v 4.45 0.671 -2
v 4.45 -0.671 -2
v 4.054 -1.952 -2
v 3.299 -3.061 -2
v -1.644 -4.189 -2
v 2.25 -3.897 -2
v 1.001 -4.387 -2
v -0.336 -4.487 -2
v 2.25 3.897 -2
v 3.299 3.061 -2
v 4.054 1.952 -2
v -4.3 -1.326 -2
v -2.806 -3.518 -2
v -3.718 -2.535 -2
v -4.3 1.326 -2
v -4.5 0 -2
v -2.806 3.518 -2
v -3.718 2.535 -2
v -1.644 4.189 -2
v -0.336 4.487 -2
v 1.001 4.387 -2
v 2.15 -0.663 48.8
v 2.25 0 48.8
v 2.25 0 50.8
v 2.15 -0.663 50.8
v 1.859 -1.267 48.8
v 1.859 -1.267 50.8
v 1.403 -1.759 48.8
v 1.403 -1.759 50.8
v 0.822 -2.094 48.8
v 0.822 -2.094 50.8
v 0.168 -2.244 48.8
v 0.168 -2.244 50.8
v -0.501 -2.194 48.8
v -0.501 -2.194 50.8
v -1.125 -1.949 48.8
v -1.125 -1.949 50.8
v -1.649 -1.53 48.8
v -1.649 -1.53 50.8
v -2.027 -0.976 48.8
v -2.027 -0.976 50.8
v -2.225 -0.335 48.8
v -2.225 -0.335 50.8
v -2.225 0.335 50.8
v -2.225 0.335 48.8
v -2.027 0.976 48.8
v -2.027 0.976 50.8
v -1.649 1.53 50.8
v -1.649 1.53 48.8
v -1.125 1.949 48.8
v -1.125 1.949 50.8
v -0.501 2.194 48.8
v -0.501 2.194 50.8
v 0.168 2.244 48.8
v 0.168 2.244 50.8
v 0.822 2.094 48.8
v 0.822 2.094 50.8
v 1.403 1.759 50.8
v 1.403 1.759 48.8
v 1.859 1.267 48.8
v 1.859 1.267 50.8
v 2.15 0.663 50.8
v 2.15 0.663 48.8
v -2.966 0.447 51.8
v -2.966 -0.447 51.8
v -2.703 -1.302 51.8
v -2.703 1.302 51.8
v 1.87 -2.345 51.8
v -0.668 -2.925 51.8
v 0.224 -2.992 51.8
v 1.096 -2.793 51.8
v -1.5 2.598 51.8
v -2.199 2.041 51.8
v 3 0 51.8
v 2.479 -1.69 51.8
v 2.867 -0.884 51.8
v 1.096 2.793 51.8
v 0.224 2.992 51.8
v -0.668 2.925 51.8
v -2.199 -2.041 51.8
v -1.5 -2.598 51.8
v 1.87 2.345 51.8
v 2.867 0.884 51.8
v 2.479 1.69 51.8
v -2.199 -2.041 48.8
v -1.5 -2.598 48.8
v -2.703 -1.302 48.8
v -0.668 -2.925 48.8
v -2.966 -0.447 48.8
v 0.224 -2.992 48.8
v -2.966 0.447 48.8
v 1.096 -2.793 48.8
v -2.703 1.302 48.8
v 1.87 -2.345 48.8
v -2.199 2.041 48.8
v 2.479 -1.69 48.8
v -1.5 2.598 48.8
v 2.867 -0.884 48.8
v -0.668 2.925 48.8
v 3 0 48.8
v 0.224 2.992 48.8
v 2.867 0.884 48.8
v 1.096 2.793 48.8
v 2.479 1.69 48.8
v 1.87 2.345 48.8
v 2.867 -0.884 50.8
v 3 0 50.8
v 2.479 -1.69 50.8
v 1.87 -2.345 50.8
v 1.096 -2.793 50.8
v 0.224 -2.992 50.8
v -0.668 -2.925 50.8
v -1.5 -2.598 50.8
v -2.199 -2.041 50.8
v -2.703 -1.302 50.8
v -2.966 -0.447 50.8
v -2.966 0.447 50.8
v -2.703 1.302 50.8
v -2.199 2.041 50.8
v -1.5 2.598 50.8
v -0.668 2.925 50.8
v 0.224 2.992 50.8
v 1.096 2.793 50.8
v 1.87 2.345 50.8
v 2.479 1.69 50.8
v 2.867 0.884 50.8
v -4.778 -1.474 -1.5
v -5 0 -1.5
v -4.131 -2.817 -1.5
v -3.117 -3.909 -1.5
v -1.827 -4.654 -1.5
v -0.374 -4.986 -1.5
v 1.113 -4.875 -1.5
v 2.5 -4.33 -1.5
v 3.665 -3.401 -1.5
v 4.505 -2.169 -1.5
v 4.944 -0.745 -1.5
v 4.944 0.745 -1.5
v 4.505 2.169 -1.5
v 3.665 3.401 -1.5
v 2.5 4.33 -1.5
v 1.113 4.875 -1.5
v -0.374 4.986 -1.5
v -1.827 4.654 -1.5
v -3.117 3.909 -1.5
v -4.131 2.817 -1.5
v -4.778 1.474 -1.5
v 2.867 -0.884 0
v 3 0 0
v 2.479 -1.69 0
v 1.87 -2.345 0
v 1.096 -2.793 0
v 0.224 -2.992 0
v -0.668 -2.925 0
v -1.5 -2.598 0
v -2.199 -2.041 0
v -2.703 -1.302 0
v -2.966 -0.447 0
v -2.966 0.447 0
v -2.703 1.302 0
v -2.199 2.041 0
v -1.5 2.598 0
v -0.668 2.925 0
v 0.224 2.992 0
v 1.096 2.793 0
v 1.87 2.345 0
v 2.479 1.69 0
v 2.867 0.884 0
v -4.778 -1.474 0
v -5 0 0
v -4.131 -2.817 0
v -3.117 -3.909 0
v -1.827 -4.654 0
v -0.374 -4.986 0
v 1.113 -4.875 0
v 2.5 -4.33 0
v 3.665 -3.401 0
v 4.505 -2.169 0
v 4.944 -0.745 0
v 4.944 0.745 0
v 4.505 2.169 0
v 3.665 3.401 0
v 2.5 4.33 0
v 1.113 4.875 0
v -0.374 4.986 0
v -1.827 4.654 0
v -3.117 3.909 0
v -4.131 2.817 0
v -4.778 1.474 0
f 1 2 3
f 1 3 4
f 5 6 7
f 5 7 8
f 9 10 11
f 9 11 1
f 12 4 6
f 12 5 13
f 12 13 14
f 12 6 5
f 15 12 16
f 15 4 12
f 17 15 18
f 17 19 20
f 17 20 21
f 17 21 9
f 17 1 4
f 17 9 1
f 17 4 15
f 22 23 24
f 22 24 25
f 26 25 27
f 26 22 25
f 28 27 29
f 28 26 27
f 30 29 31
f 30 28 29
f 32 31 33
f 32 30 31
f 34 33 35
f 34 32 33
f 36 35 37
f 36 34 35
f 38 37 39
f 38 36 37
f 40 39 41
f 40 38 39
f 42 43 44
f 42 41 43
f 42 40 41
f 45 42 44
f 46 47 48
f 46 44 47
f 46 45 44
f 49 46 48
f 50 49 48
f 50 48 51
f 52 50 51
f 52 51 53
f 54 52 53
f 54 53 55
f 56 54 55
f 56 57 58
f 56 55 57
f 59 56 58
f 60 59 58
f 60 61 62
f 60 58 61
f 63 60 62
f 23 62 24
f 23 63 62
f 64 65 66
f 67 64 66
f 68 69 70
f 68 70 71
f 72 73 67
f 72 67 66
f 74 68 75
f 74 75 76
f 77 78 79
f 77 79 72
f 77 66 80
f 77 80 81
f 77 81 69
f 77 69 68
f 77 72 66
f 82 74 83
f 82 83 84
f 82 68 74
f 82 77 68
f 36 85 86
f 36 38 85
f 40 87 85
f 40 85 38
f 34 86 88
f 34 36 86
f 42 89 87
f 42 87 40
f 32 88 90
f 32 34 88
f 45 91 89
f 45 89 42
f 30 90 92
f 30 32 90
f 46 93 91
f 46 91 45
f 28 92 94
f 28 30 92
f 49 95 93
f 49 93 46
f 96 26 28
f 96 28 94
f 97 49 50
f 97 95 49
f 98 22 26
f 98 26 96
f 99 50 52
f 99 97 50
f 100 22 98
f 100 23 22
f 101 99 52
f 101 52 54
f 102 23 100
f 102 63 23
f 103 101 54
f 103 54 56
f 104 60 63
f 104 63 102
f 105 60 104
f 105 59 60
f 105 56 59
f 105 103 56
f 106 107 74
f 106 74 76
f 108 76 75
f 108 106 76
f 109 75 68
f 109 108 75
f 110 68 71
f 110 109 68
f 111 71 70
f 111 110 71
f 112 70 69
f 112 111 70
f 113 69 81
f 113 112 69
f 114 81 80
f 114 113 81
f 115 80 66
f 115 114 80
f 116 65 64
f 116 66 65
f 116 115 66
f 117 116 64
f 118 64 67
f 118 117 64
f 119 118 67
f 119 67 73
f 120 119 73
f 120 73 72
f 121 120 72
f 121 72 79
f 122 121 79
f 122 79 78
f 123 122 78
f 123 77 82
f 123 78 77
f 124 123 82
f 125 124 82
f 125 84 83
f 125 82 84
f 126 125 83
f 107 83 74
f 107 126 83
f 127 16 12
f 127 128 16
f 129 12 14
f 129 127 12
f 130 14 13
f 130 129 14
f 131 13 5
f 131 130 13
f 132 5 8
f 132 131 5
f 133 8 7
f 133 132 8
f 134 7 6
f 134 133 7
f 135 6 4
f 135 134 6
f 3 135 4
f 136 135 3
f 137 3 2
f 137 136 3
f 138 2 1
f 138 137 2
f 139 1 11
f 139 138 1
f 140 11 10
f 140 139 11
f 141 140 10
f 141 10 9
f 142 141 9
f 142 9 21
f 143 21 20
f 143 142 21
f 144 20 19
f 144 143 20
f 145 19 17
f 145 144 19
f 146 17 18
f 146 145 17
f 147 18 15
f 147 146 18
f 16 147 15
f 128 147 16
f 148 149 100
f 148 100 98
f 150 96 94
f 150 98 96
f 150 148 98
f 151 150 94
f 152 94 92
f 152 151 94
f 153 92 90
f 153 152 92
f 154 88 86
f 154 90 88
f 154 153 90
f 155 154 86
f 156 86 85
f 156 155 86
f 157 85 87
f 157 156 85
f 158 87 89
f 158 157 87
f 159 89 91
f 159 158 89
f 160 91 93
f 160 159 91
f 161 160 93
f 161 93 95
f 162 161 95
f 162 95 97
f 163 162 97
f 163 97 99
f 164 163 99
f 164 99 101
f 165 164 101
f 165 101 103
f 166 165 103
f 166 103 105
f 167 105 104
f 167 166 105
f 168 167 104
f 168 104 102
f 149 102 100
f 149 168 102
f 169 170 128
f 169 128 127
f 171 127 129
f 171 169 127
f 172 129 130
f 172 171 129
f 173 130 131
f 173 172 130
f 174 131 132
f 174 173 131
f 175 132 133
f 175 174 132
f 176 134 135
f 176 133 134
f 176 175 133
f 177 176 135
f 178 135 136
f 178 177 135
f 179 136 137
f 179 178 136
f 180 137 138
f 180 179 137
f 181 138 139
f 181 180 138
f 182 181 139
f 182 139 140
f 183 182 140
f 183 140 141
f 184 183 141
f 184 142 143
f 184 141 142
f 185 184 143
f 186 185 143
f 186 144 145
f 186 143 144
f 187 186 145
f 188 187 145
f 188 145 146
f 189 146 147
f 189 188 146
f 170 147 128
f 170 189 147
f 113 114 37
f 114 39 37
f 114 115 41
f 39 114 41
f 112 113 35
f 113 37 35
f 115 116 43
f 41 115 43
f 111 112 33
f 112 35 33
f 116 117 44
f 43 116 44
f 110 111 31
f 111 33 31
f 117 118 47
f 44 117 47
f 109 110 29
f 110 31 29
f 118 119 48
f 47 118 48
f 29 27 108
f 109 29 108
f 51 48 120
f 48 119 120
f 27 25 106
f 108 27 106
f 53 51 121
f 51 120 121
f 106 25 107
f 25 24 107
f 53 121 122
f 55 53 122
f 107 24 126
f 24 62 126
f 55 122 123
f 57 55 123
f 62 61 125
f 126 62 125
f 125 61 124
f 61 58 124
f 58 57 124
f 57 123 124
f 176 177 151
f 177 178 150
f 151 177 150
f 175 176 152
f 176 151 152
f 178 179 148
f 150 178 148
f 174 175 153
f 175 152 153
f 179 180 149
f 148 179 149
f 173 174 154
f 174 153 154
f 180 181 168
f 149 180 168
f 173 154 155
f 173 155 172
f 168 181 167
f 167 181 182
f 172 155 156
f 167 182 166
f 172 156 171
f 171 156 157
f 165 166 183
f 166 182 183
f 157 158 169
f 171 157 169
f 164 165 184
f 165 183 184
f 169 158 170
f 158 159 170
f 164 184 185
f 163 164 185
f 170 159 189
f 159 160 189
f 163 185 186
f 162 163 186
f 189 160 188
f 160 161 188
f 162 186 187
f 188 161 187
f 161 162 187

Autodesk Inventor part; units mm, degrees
ref_plane "YZ Plane" through (0, 0, 0) normal (1, 0, 0) x (0, 1, 0)
ref_plane "XZ Plane" through (0, 0, 0) normal (0, 1, 0) x (-1, 0, 0)
ref_plane "XY Plane" through (0, 0, 0) normal (0, 0, 1) x (1, 0, 0)
sketch "スケッチ1" plane through (0, 0, 0) normal (0, 0, 1) x (1, 0, 0)
  circle A0 centre (0, 0) radius 3
  dimension "d0" = 6
extrude "押し出し1" add sketch "スケッチ1" along normal blind 47.8
sketch "スケッチ2" plane through (0, 0, 0) normal (0, 0, -1) x (-1, 0, 0)
  circle A0 centre (0, 0) radius 3 projected
  circle A1 centre (0, 0) radius 5
  dimension "d3" = 10
extrude "押し出し2" add sketch "スケッチ2" along normal blind 2 contours A0 | A1
sketch "スケッチ3" plane through (0, 0, 47.8) normal (0, 0, 1) x (1, 0, 0)
  circle A0 centre (0, 0) radius 3 projected
extrude "押し出し3" add sketch "スケッチ3" along normal blind 1
sketch "スケッチ4" plane through (0, 0, 48.8) normal (0, 0, 1) x (1, 0, 0)
  circle A0 centre (0, 0) radius 3 projected
  circle A1 centre (0, 0) radius 2.25
  dimension "d8" = 4.5
extrude "押し出し4" add sketch "スケッチ4" along normal blind 2 contours A1
sketch "スケッチ5" plane through (0, 0, 50.8) normal (0, 0, 1) x (1, 0, 0)
  circle A0 centre (0, 0) radius 2.25 projected
  circle A1 centre (0, 0) radius 3
  dimension "d11" = 6
extrude "押し出し5" add sketch "スケッチ5" along normal blind 1 contours A0 | A1
chamfer "面取り1" distance 0.5 angle 45 1 edges at (5, 0, -2)
properties part number "shaft6-47.8" material "ステンレス鋼"
